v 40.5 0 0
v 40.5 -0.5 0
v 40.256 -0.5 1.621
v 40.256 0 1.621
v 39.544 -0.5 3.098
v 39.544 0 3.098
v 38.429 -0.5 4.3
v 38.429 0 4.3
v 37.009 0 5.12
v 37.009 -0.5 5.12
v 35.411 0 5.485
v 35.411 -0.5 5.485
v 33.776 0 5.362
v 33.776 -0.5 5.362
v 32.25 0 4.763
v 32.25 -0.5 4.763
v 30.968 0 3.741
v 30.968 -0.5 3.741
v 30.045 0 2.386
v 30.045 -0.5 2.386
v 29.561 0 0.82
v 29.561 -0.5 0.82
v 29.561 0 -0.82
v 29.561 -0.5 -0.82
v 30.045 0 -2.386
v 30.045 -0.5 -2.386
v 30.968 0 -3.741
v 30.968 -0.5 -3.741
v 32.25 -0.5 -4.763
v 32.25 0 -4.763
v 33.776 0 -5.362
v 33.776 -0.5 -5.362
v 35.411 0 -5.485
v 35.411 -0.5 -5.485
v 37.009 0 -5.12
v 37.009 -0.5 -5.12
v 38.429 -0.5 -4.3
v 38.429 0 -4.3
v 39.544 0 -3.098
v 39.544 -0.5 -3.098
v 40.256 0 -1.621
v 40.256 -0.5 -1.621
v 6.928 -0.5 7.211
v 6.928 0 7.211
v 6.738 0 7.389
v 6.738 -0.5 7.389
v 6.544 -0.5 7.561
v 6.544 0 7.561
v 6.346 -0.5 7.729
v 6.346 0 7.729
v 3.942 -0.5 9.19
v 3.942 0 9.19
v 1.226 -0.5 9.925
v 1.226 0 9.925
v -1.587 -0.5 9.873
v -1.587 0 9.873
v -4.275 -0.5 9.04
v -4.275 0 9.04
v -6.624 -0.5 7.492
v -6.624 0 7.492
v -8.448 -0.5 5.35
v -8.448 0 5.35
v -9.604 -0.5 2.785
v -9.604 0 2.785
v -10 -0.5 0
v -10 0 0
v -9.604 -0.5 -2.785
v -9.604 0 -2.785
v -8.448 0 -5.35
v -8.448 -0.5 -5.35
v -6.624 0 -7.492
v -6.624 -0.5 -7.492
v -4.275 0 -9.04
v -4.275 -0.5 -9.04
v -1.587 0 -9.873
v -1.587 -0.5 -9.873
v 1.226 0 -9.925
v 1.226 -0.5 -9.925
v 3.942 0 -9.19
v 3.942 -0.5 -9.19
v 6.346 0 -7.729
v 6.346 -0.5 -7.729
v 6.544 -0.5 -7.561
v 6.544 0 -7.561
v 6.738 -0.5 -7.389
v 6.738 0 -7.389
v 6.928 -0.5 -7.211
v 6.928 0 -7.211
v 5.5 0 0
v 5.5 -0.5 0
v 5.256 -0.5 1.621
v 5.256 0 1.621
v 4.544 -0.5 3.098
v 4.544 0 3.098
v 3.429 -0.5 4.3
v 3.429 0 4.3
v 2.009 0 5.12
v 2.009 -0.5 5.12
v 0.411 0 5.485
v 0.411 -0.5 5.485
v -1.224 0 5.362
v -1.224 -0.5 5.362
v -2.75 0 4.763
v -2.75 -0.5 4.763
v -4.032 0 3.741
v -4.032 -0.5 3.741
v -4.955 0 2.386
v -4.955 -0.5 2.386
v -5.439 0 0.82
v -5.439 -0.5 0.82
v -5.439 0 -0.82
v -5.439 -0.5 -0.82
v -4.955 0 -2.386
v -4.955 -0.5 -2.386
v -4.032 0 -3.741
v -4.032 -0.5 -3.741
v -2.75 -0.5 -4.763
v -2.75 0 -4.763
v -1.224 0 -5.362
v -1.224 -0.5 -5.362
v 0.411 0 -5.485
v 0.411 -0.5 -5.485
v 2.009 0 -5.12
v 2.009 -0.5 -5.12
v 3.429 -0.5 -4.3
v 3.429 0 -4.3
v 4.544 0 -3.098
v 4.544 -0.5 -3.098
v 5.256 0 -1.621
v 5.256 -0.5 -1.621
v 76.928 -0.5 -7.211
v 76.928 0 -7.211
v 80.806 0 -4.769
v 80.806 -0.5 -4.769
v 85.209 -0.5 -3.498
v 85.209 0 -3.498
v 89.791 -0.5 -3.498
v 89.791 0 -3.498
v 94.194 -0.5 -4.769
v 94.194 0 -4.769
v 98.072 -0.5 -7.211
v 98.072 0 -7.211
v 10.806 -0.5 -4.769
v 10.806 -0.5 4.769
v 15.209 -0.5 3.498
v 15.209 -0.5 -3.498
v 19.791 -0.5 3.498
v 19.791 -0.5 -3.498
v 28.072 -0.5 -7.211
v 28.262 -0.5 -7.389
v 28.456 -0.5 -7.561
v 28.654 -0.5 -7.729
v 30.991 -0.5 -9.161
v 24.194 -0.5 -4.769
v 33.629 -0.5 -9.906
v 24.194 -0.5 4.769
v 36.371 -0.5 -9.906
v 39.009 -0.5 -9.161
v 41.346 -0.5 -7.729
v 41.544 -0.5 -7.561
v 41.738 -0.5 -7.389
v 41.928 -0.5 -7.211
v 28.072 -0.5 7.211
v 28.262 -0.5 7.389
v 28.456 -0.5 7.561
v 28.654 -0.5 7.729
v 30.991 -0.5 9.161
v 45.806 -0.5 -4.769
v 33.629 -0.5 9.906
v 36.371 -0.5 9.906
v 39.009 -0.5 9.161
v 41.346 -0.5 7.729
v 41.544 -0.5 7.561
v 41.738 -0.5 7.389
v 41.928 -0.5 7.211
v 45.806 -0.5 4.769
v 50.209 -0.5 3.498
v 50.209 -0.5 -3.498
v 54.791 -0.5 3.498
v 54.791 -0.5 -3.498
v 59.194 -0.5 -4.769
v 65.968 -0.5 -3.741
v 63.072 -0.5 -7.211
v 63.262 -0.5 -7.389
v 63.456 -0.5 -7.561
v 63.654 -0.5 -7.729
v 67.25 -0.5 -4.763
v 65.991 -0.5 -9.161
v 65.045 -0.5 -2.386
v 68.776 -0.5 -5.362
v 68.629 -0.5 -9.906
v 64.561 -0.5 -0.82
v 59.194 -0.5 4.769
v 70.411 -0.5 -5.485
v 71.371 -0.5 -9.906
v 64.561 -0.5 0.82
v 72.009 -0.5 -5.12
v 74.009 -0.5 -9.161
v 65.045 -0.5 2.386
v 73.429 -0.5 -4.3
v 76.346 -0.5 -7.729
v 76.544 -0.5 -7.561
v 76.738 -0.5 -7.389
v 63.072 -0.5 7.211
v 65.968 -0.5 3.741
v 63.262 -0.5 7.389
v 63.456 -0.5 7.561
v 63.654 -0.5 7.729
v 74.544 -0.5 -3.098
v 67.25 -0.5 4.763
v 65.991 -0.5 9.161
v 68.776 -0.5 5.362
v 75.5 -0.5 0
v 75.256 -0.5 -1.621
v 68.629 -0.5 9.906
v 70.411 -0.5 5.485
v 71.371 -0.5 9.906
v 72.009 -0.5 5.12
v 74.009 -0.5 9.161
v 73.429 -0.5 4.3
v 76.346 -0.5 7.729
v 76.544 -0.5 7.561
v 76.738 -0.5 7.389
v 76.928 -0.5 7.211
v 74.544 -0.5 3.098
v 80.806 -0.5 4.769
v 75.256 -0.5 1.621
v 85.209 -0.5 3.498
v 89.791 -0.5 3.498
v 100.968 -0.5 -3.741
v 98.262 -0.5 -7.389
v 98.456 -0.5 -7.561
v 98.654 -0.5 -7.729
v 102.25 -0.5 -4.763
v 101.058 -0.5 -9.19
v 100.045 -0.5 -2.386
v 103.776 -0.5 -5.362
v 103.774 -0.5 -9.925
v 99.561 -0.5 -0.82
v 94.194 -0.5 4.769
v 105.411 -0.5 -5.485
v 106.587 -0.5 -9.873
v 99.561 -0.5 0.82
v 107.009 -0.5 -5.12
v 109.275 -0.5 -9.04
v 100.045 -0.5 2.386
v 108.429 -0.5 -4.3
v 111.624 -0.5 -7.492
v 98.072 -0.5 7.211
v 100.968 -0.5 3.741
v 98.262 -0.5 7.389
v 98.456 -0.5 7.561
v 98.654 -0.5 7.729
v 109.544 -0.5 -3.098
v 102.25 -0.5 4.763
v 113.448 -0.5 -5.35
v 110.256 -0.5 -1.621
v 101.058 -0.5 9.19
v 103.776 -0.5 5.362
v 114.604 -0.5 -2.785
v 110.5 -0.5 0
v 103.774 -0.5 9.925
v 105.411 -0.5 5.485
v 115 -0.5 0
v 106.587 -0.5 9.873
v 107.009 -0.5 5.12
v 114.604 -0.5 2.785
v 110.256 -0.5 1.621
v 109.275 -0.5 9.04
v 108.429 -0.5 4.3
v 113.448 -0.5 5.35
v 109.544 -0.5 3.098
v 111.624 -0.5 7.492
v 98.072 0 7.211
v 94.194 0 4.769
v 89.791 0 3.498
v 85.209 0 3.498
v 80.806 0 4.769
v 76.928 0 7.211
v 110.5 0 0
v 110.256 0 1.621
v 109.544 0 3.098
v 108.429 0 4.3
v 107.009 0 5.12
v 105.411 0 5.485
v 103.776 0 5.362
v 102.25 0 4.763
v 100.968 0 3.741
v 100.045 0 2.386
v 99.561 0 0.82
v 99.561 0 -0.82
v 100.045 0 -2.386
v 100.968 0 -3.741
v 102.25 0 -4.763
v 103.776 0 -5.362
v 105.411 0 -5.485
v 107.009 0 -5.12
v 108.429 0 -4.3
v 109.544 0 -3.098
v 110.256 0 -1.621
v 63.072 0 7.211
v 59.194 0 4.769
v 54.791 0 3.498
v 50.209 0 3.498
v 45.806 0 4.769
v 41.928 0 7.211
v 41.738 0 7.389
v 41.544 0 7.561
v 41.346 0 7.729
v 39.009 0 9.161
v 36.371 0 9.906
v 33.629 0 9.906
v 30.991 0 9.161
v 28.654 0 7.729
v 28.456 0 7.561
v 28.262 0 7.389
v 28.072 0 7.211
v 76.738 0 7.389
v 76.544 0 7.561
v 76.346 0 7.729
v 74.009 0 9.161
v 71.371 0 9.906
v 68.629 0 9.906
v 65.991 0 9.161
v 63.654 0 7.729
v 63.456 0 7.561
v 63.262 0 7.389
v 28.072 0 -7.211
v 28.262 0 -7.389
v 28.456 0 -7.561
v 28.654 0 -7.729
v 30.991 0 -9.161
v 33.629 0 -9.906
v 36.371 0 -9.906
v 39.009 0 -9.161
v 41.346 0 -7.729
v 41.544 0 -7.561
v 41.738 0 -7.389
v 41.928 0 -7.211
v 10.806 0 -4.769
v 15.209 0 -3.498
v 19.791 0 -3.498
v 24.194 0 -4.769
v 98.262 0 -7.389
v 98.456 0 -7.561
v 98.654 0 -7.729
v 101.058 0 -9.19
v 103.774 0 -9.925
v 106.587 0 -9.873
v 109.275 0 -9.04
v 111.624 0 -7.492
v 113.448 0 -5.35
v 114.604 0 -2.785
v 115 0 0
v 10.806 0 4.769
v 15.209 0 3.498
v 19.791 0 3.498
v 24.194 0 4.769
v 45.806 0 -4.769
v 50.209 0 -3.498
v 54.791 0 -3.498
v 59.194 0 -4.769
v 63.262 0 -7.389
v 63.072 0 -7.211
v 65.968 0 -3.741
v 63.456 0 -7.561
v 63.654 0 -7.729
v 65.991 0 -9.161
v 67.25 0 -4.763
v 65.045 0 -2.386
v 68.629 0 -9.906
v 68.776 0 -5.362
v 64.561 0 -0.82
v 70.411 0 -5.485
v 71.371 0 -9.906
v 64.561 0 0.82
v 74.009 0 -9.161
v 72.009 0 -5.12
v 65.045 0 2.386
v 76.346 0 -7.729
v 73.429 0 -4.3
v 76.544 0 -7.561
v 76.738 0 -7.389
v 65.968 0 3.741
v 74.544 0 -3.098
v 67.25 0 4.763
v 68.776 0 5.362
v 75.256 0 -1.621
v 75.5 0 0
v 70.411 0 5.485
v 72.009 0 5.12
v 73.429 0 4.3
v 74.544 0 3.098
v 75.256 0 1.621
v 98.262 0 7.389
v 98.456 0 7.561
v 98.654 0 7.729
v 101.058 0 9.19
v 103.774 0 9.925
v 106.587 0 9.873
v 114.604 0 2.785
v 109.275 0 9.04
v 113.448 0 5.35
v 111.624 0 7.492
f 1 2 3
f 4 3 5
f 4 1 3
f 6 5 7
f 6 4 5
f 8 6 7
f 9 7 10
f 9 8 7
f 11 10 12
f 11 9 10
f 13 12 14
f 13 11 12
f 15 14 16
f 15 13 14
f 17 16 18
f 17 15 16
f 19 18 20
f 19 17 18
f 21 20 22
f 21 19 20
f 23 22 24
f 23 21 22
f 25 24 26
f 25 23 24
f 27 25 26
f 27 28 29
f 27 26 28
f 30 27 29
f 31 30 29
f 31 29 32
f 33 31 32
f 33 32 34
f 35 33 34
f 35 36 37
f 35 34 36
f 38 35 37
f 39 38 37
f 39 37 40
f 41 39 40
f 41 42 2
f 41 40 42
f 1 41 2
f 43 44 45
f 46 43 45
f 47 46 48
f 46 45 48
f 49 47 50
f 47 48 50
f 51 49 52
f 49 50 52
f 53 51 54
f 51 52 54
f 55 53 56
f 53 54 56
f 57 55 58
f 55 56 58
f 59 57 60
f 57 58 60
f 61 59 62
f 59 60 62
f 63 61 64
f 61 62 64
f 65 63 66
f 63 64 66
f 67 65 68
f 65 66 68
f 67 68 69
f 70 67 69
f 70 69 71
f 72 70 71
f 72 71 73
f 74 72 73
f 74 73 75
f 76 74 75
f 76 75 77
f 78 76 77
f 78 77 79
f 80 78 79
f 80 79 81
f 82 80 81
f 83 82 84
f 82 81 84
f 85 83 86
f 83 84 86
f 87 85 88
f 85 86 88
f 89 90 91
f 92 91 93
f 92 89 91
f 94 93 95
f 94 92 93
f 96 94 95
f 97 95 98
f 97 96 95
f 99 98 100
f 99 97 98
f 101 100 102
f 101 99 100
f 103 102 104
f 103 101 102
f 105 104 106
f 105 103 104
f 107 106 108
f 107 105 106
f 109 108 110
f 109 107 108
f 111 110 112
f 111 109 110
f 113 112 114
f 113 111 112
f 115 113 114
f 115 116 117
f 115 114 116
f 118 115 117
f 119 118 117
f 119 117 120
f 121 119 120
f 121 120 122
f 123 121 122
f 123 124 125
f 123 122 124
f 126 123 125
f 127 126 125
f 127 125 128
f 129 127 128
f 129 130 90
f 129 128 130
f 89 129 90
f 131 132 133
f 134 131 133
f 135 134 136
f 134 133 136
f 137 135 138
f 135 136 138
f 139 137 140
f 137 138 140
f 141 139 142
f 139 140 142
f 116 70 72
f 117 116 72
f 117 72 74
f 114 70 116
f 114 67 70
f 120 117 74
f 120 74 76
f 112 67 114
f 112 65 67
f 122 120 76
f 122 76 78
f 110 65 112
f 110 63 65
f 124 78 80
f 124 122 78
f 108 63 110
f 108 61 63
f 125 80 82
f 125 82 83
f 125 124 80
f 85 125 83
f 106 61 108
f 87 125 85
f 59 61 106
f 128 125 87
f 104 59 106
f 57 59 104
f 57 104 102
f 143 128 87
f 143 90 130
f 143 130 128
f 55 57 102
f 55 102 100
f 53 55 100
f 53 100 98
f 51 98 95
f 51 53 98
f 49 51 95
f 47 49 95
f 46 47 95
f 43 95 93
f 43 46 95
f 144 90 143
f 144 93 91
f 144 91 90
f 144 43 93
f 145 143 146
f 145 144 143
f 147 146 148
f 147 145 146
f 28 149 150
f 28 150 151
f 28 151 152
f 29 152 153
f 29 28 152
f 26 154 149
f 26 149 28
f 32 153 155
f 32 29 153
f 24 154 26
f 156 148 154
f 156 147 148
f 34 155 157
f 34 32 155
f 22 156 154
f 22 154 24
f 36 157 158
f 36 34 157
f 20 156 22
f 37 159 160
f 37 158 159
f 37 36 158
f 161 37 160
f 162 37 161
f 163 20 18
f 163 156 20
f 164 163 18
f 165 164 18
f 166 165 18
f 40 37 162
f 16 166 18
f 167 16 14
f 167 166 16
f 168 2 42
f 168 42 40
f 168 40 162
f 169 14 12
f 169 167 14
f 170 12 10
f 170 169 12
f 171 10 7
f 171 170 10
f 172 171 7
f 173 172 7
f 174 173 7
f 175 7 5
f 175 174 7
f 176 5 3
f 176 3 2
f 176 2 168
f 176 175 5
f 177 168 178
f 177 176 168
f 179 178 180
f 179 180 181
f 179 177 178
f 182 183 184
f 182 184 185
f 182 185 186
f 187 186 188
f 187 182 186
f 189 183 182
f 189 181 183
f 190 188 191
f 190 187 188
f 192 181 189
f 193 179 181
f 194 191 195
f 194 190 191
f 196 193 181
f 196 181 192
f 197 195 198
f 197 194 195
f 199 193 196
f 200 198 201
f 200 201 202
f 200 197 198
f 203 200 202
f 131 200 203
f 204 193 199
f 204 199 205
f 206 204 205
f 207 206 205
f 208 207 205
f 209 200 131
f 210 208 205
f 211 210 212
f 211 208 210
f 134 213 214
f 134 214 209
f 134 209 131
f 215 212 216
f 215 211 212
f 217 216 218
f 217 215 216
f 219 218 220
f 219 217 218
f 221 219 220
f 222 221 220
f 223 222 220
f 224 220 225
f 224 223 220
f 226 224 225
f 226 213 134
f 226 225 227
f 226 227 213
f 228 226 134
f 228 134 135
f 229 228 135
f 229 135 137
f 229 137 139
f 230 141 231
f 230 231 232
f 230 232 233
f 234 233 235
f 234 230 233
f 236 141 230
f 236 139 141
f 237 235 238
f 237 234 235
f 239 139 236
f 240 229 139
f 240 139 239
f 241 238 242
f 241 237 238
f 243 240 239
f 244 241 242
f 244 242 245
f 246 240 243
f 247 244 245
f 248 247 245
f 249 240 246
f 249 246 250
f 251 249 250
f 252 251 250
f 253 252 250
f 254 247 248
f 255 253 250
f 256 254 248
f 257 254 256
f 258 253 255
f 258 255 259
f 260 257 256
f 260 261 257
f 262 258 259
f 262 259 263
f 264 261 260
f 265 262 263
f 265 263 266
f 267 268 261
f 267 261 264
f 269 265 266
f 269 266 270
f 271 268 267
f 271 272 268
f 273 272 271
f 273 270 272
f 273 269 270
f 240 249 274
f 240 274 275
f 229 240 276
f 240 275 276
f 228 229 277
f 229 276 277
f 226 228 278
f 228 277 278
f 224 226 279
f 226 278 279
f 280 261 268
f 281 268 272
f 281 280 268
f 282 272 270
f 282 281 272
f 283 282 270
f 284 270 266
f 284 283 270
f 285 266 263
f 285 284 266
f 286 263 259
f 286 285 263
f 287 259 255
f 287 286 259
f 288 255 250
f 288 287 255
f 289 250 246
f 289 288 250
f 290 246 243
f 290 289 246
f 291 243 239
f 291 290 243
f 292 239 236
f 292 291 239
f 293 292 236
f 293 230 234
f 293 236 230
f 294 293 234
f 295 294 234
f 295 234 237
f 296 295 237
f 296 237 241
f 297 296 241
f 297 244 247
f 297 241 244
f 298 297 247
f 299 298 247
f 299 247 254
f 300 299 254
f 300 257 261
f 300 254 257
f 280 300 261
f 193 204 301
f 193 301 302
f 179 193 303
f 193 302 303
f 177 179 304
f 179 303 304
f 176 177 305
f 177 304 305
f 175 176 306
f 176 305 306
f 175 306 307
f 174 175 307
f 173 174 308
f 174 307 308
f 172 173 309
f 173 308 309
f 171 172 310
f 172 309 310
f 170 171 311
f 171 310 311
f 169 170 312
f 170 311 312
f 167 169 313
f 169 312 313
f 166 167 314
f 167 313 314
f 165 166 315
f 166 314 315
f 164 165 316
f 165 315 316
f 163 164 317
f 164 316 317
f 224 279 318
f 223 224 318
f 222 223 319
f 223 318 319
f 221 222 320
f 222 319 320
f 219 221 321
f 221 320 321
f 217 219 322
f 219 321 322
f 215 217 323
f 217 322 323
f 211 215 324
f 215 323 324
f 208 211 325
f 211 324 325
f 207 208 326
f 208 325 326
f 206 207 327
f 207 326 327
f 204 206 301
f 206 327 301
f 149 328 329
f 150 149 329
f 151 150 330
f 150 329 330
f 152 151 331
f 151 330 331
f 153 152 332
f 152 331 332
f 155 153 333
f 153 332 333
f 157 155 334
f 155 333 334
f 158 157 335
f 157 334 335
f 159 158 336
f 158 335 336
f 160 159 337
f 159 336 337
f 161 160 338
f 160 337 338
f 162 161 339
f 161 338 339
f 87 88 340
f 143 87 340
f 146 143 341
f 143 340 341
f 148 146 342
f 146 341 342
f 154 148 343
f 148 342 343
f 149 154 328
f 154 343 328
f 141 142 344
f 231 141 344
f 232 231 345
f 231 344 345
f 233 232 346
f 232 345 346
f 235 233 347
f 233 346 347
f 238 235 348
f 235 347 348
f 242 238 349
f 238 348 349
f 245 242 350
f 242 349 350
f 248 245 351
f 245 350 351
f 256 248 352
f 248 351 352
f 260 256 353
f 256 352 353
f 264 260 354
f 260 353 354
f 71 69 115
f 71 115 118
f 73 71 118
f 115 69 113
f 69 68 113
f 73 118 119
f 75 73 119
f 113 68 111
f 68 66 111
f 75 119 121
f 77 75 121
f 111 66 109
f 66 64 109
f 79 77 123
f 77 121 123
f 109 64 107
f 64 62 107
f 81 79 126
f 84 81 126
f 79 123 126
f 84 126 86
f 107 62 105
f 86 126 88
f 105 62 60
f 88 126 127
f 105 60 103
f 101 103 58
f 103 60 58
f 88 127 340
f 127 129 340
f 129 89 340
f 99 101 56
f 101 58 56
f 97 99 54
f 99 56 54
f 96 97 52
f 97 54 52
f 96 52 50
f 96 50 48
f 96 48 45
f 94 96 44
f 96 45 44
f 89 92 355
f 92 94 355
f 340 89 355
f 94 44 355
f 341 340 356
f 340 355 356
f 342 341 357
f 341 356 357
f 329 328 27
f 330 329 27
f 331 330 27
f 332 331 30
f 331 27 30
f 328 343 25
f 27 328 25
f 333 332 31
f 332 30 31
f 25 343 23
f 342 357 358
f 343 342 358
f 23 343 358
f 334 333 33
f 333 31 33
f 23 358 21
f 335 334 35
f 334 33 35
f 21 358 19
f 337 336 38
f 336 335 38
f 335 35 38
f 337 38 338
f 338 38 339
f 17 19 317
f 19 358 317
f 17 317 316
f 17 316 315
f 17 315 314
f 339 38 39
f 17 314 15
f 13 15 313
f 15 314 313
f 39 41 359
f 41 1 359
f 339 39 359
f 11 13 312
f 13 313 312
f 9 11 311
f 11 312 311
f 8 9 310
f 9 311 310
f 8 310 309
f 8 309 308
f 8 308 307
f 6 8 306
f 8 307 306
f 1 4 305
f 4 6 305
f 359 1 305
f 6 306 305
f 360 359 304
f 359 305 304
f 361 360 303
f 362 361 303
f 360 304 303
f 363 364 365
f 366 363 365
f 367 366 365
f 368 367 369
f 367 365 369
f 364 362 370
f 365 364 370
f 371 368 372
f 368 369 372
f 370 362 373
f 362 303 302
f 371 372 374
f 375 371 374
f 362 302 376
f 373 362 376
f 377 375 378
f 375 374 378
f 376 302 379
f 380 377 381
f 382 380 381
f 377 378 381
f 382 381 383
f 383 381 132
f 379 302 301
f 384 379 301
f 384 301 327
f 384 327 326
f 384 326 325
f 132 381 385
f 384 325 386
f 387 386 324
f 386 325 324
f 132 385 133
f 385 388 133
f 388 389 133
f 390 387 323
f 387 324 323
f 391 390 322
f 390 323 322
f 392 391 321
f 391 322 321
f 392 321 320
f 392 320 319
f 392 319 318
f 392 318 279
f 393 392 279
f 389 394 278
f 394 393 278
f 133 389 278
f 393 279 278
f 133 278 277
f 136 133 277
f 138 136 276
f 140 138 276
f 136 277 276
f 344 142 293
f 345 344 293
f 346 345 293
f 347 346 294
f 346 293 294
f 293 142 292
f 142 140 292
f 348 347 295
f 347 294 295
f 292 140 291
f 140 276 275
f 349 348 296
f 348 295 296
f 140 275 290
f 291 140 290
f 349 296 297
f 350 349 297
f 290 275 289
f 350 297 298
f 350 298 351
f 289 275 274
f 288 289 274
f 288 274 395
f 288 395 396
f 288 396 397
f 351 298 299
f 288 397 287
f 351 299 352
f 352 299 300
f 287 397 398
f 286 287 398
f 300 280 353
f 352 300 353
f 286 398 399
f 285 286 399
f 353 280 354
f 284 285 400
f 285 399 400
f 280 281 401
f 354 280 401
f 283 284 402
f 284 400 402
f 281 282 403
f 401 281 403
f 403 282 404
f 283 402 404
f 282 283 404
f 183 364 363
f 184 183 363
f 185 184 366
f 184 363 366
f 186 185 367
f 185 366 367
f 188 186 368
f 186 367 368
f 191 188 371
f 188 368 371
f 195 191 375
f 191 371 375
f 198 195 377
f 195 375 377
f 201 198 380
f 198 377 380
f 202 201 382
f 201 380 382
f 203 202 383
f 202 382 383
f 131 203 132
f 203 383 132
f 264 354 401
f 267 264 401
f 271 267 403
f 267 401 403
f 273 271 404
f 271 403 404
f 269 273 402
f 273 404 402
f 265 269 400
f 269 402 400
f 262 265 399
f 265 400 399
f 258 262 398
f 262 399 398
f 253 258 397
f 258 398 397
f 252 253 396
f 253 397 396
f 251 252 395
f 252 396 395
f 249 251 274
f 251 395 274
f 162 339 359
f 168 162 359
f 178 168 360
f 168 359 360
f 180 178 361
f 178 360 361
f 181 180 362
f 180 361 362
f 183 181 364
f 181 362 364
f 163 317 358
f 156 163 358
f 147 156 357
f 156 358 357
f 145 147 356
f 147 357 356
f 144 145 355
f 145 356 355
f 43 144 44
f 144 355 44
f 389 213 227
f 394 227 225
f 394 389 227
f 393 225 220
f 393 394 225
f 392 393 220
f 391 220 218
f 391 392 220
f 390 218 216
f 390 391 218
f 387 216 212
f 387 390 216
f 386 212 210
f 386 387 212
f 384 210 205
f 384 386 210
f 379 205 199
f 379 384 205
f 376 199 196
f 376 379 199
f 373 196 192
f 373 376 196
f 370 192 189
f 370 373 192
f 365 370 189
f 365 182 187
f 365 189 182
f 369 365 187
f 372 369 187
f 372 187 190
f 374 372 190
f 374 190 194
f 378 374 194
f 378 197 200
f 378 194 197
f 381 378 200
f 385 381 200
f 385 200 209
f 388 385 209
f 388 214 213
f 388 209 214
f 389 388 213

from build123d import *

# Parameters (mm, degrees)
F1_R     = 10
F3_DEPTH = 0.5
F2_R     = 5.5
F4_DEPTH = 25
F9_DEPTH = 0.5


with BuildPart() as f3:
    # F1 (on Front) → F3 (new body)
    with BuildSketch(Plane.XZ):
        Circle(F1_R)
    extrude(amount=F3_DEPTH)

    # F2 (on Front) → F4 (cut)
    with BuildSketch(Plane.XZ):
        Circle(F2_R)
    extrude(amount=F4_DEPTH, mode=Mode.SUBTRACT)



with BuildPart() as f5_1:
    # F5: copy of F3
    add(f3.part.moved(Location((35, 0, 0))))


with BuildPart() as f6_1:
    # F6: copy of F3
    add(f3.part.moved(Location((105, 0, 0))))


with BuildPart() as f7_1:
    # F7: copy of F3
    add(f3.part.moved(Location((70, 0, 0))))


with BuildPart() as f3_1:
    add(f3.part)

    add(f5_1.part)  # F9 merges F5_1

    add(f6_1.part)  # F9 merges F6_1

    add(f7_1.part)  # F9 merges F7_1
    # F8 (on Front) → F9 (join)
    with BuildSketch(Plane.XZ):
        with BuildLine():
            ThreePointArc((28.654308, 7.728661), (17.5, 3.336749), (6.345692, 7.728661))
            Line((6.345692, 7.728661), (6.345692, -7.728661))
            ThreePointArc((6.345692, -7.728661), (17.5, -3.336749), (28.654308, -7.728661))
            Line((28.654308, -7.728661), (28.654308, 7.728661))
        make_face()
        with BuildLine():
            ThreePointArc((63.654308, 7.728661), (52.5, 3.336749), (41.345692, 7.728661))
            Line((41.345692, 7.728661), (41.345692, -7.728661))
            ThreePointArc((41.345692, -7.728661), (52.5, -3.336749), (63.654308, -7.728661))
            Line((63.654308, -7.728661), (63.654308, 7.728661))
        make_face()
        with BuildLine():
            ThreePointArc((98.654308, 7.728661), (87.5, 3.336749), (76.345692, 7.728661))
            Line((76.345692, 7.728661), (76.345692, -7.728661))
            ThreePointArc((76.345692, -7.728661), (87.5, -3.336749), (98.654308, -7.728661))
            Line((98.654308, -7.728661), (98.654308, 7.728661))
        make_face()
    extrude(amount=F9_DEPTH)


solid = f3_1.part
